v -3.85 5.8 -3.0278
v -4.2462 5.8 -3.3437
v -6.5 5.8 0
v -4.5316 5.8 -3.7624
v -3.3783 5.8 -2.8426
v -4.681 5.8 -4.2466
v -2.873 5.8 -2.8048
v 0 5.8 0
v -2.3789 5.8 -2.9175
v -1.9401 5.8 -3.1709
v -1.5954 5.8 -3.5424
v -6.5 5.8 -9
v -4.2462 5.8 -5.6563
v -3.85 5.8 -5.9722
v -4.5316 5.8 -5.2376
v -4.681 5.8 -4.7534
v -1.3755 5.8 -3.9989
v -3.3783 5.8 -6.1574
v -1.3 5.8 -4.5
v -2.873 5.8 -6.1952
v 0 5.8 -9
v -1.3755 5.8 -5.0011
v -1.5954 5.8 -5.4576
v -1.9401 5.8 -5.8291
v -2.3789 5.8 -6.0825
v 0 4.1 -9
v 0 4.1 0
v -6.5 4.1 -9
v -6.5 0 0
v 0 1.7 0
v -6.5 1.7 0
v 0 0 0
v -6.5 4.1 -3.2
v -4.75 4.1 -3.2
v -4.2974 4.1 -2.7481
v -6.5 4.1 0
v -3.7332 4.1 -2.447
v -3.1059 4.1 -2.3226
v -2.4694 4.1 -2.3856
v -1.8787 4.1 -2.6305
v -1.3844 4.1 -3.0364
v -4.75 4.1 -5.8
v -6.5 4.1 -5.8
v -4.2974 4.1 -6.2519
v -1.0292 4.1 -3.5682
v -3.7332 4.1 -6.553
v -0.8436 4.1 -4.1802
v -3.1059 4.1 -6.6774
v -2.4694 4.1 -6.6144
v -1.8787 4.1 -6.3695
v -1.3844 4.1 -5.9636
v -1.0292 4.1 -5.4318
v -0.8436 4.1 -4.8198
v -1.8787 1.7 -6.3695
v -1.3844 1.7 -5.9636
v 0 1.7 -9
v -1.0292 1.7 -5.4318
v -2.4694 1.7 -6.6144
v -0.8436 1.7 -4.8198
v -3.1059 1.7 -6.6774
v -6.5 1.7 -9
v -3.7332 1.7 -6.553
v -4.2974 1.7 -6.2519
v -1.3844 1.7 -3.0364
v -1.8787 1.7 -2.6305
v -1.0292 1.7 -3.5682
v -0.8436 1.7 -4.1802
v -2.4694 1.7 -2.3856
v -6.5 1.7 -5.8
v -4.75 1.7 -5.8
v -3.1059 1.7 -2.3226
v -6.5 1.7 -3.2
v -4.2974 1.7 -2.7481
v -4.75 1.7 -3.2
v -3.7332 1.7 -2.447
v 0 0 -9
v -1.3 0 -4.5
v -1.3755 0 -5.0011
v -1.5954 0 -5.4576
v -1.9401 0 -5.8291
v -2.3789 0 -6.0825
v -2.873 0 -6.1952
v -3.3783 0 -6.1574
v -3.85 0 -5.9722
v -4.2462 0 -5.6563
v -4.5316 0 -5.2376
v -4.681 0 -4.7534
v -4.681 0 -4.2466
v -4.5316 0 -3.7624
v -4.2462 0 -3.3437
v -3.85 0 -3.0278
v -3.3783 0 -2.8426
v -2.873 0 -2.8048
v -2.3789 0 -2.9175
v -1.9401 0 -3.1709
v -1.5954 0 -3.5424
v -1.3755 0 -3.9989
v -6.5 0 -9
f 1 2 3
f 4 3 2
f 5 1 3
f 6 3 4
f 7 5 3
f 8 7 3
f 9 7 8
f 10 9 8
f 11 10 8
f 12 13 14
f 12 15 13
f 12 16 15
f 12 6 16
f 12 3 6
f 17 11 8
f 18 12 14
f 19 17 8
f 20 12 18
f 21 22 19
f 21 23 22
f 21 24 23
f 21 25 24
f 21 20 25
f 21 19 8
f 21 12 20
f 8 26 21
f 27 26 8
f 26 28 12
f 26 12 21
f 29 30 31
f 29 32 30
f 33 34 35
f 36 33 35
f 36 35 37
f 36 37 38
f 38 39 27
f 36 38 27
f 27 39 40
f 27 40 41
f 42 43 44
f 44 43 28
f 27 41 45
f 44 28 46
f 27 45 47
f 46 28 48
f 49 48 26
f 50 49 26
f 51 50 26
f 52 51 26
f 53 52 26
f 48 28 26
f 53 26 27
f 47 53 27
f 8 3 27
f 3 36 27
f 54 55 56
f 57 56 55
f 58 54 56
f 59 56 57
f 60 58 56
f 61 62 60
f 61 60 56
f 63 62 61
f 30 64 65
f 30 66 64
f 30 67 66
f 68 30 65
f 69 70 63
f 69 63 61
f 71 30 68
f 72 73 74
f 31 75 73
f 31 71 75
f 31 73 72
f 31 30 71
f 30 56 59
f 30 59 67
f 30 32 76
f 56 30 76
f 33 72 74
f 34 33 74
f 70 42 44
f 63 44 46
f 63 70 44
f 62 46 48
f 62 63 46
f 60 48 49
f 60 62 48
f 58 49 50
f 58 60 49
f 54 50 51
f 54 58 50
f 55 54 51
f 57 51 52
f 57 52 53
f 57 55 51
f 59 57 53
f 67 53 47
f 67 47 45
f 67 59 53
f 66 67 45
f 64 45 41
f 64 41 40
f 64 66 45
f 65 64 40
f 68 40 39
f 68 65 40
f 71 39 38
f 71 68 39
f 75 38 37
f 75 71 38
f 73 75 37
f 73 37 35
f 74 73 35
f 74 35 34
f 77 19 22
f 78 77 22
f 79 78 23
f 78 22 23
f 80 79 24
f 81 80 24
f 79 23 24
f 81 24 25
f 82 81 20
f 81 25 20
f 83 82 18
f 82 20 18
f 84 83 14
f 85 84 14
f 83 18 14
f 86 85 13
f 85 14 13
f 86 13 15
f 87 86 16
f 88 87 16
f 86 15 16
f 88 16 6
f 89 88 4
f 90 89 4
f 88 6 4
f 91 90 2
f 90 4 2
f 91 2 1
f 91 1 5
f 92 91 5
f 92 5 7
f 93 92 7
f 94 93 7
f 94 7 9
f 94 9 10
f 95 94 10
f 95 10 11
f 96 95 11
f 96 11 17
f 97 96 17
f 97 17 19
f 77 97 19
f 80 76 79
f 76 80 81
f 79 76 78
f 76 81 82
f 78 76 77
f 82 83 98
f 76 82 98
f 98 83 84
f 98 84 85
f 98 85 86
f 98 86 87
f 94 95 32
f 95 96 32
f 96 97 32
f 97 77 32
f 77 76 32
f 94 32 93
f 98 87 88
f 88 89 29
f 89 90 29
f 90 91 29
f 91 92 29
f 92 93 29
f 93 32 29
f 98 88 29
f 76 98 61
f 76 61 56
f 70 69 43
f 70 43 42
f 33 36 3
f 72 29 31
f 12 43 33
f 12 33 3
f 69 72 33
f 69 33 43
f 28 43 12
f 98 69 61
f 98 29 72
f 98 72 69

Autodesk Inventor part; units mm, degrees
ref_plane "YZ Plane" through (0, 0, 0) normal (1, 0, 0) x (0, 1, 0)
ref_plane "XZ Plane" through (0, 0, 0) normal (0, 1, 0) x (-1, 0, 0)
ref_plane "XY Plane" through (0, 0, 0) normal (0, 0, 1) x (1, 0, 0)
sketch "Sketch1" plane through (0, 0, 0) normal (0, 1, 0) x (-1, 0, 0)
  line L0 (0, 0) -> (6.5, 0)
  line L1 (6.5, 0) -> (6.5, -9)
  line L2 (6.5, -9) -> (0, -9)
  line L3 (0, 0) -> (0, -9)
  dimension "d0" = 6.5
  dimension "d1" = 9
extrude "Extrusion1" add sketch "Sketch1" along normal blind 1.7
sketch "Sketch2" plane through (0, 1.7, 0) normal (0, 1, 0) x (1, 0, 0)
  circle A0 centre (-3, 4.5) radius 1.7
  dimension "d9" = 3.4
extrude "Extrusion2" cut sketch "Sketch2" against normal blind 1.7
sketch "Sketch3" plane through (0, 1.7, 0) normal (0, 1, 0) x (1, 0, 0)
  circle A0 centre (-3, 4.5) radius 2.18
  line L0 (-6.5, 3.2) -> (-4.75, 3.2)
  line L1 (-6.5, 5.8) -> (-4.75, 5.8)
  line L2 (-6.5, 3.2) -> (-6.5, 5.8)
  line L3 (-6.5, 9) -> (-6.5, 0) projected
  dimension "d12" = 4.36
extrude "Extrusion3" add sketch "Sketch3" along normal blind 2.4
sketch "Sketch4" plane through (0, 4.1, 0) normal (0, 1, 0) x (1, 0, 0)
  line L0 (-6.5, 0) -> (0, 0) projected
  line L1 (-6.5, 9) -> (-6.5, 5.8) projected
  line L2 (0, 0) -> (-6.5, 0)
  line L3 (-6.5, 0) -> (-6.5, 9)
  line L4 (-6.5, 9) -> (0, 9)
  line L5 (0, 9) -> (0, 0)
extrude "Extrusion4" add sketch "Sketch4" along normal blind 1.7
sketch "Sketch5" plane through (0, 5.8, 0) normal (0, 1, 0) x (1, 0, 0)
  circle A0 centre (-3, 4.5) radius 1.7 projected
  circle A1 centre (-3, 4.5) radius 1.7
  dimension "d20" = 3.4
extrude "Extrusion5" cut sketch "Sketch5" against normal blind 5.8
properties part number "MMAE 232 Assignment 2_Rubber Grommet - Dylan Tamras"
